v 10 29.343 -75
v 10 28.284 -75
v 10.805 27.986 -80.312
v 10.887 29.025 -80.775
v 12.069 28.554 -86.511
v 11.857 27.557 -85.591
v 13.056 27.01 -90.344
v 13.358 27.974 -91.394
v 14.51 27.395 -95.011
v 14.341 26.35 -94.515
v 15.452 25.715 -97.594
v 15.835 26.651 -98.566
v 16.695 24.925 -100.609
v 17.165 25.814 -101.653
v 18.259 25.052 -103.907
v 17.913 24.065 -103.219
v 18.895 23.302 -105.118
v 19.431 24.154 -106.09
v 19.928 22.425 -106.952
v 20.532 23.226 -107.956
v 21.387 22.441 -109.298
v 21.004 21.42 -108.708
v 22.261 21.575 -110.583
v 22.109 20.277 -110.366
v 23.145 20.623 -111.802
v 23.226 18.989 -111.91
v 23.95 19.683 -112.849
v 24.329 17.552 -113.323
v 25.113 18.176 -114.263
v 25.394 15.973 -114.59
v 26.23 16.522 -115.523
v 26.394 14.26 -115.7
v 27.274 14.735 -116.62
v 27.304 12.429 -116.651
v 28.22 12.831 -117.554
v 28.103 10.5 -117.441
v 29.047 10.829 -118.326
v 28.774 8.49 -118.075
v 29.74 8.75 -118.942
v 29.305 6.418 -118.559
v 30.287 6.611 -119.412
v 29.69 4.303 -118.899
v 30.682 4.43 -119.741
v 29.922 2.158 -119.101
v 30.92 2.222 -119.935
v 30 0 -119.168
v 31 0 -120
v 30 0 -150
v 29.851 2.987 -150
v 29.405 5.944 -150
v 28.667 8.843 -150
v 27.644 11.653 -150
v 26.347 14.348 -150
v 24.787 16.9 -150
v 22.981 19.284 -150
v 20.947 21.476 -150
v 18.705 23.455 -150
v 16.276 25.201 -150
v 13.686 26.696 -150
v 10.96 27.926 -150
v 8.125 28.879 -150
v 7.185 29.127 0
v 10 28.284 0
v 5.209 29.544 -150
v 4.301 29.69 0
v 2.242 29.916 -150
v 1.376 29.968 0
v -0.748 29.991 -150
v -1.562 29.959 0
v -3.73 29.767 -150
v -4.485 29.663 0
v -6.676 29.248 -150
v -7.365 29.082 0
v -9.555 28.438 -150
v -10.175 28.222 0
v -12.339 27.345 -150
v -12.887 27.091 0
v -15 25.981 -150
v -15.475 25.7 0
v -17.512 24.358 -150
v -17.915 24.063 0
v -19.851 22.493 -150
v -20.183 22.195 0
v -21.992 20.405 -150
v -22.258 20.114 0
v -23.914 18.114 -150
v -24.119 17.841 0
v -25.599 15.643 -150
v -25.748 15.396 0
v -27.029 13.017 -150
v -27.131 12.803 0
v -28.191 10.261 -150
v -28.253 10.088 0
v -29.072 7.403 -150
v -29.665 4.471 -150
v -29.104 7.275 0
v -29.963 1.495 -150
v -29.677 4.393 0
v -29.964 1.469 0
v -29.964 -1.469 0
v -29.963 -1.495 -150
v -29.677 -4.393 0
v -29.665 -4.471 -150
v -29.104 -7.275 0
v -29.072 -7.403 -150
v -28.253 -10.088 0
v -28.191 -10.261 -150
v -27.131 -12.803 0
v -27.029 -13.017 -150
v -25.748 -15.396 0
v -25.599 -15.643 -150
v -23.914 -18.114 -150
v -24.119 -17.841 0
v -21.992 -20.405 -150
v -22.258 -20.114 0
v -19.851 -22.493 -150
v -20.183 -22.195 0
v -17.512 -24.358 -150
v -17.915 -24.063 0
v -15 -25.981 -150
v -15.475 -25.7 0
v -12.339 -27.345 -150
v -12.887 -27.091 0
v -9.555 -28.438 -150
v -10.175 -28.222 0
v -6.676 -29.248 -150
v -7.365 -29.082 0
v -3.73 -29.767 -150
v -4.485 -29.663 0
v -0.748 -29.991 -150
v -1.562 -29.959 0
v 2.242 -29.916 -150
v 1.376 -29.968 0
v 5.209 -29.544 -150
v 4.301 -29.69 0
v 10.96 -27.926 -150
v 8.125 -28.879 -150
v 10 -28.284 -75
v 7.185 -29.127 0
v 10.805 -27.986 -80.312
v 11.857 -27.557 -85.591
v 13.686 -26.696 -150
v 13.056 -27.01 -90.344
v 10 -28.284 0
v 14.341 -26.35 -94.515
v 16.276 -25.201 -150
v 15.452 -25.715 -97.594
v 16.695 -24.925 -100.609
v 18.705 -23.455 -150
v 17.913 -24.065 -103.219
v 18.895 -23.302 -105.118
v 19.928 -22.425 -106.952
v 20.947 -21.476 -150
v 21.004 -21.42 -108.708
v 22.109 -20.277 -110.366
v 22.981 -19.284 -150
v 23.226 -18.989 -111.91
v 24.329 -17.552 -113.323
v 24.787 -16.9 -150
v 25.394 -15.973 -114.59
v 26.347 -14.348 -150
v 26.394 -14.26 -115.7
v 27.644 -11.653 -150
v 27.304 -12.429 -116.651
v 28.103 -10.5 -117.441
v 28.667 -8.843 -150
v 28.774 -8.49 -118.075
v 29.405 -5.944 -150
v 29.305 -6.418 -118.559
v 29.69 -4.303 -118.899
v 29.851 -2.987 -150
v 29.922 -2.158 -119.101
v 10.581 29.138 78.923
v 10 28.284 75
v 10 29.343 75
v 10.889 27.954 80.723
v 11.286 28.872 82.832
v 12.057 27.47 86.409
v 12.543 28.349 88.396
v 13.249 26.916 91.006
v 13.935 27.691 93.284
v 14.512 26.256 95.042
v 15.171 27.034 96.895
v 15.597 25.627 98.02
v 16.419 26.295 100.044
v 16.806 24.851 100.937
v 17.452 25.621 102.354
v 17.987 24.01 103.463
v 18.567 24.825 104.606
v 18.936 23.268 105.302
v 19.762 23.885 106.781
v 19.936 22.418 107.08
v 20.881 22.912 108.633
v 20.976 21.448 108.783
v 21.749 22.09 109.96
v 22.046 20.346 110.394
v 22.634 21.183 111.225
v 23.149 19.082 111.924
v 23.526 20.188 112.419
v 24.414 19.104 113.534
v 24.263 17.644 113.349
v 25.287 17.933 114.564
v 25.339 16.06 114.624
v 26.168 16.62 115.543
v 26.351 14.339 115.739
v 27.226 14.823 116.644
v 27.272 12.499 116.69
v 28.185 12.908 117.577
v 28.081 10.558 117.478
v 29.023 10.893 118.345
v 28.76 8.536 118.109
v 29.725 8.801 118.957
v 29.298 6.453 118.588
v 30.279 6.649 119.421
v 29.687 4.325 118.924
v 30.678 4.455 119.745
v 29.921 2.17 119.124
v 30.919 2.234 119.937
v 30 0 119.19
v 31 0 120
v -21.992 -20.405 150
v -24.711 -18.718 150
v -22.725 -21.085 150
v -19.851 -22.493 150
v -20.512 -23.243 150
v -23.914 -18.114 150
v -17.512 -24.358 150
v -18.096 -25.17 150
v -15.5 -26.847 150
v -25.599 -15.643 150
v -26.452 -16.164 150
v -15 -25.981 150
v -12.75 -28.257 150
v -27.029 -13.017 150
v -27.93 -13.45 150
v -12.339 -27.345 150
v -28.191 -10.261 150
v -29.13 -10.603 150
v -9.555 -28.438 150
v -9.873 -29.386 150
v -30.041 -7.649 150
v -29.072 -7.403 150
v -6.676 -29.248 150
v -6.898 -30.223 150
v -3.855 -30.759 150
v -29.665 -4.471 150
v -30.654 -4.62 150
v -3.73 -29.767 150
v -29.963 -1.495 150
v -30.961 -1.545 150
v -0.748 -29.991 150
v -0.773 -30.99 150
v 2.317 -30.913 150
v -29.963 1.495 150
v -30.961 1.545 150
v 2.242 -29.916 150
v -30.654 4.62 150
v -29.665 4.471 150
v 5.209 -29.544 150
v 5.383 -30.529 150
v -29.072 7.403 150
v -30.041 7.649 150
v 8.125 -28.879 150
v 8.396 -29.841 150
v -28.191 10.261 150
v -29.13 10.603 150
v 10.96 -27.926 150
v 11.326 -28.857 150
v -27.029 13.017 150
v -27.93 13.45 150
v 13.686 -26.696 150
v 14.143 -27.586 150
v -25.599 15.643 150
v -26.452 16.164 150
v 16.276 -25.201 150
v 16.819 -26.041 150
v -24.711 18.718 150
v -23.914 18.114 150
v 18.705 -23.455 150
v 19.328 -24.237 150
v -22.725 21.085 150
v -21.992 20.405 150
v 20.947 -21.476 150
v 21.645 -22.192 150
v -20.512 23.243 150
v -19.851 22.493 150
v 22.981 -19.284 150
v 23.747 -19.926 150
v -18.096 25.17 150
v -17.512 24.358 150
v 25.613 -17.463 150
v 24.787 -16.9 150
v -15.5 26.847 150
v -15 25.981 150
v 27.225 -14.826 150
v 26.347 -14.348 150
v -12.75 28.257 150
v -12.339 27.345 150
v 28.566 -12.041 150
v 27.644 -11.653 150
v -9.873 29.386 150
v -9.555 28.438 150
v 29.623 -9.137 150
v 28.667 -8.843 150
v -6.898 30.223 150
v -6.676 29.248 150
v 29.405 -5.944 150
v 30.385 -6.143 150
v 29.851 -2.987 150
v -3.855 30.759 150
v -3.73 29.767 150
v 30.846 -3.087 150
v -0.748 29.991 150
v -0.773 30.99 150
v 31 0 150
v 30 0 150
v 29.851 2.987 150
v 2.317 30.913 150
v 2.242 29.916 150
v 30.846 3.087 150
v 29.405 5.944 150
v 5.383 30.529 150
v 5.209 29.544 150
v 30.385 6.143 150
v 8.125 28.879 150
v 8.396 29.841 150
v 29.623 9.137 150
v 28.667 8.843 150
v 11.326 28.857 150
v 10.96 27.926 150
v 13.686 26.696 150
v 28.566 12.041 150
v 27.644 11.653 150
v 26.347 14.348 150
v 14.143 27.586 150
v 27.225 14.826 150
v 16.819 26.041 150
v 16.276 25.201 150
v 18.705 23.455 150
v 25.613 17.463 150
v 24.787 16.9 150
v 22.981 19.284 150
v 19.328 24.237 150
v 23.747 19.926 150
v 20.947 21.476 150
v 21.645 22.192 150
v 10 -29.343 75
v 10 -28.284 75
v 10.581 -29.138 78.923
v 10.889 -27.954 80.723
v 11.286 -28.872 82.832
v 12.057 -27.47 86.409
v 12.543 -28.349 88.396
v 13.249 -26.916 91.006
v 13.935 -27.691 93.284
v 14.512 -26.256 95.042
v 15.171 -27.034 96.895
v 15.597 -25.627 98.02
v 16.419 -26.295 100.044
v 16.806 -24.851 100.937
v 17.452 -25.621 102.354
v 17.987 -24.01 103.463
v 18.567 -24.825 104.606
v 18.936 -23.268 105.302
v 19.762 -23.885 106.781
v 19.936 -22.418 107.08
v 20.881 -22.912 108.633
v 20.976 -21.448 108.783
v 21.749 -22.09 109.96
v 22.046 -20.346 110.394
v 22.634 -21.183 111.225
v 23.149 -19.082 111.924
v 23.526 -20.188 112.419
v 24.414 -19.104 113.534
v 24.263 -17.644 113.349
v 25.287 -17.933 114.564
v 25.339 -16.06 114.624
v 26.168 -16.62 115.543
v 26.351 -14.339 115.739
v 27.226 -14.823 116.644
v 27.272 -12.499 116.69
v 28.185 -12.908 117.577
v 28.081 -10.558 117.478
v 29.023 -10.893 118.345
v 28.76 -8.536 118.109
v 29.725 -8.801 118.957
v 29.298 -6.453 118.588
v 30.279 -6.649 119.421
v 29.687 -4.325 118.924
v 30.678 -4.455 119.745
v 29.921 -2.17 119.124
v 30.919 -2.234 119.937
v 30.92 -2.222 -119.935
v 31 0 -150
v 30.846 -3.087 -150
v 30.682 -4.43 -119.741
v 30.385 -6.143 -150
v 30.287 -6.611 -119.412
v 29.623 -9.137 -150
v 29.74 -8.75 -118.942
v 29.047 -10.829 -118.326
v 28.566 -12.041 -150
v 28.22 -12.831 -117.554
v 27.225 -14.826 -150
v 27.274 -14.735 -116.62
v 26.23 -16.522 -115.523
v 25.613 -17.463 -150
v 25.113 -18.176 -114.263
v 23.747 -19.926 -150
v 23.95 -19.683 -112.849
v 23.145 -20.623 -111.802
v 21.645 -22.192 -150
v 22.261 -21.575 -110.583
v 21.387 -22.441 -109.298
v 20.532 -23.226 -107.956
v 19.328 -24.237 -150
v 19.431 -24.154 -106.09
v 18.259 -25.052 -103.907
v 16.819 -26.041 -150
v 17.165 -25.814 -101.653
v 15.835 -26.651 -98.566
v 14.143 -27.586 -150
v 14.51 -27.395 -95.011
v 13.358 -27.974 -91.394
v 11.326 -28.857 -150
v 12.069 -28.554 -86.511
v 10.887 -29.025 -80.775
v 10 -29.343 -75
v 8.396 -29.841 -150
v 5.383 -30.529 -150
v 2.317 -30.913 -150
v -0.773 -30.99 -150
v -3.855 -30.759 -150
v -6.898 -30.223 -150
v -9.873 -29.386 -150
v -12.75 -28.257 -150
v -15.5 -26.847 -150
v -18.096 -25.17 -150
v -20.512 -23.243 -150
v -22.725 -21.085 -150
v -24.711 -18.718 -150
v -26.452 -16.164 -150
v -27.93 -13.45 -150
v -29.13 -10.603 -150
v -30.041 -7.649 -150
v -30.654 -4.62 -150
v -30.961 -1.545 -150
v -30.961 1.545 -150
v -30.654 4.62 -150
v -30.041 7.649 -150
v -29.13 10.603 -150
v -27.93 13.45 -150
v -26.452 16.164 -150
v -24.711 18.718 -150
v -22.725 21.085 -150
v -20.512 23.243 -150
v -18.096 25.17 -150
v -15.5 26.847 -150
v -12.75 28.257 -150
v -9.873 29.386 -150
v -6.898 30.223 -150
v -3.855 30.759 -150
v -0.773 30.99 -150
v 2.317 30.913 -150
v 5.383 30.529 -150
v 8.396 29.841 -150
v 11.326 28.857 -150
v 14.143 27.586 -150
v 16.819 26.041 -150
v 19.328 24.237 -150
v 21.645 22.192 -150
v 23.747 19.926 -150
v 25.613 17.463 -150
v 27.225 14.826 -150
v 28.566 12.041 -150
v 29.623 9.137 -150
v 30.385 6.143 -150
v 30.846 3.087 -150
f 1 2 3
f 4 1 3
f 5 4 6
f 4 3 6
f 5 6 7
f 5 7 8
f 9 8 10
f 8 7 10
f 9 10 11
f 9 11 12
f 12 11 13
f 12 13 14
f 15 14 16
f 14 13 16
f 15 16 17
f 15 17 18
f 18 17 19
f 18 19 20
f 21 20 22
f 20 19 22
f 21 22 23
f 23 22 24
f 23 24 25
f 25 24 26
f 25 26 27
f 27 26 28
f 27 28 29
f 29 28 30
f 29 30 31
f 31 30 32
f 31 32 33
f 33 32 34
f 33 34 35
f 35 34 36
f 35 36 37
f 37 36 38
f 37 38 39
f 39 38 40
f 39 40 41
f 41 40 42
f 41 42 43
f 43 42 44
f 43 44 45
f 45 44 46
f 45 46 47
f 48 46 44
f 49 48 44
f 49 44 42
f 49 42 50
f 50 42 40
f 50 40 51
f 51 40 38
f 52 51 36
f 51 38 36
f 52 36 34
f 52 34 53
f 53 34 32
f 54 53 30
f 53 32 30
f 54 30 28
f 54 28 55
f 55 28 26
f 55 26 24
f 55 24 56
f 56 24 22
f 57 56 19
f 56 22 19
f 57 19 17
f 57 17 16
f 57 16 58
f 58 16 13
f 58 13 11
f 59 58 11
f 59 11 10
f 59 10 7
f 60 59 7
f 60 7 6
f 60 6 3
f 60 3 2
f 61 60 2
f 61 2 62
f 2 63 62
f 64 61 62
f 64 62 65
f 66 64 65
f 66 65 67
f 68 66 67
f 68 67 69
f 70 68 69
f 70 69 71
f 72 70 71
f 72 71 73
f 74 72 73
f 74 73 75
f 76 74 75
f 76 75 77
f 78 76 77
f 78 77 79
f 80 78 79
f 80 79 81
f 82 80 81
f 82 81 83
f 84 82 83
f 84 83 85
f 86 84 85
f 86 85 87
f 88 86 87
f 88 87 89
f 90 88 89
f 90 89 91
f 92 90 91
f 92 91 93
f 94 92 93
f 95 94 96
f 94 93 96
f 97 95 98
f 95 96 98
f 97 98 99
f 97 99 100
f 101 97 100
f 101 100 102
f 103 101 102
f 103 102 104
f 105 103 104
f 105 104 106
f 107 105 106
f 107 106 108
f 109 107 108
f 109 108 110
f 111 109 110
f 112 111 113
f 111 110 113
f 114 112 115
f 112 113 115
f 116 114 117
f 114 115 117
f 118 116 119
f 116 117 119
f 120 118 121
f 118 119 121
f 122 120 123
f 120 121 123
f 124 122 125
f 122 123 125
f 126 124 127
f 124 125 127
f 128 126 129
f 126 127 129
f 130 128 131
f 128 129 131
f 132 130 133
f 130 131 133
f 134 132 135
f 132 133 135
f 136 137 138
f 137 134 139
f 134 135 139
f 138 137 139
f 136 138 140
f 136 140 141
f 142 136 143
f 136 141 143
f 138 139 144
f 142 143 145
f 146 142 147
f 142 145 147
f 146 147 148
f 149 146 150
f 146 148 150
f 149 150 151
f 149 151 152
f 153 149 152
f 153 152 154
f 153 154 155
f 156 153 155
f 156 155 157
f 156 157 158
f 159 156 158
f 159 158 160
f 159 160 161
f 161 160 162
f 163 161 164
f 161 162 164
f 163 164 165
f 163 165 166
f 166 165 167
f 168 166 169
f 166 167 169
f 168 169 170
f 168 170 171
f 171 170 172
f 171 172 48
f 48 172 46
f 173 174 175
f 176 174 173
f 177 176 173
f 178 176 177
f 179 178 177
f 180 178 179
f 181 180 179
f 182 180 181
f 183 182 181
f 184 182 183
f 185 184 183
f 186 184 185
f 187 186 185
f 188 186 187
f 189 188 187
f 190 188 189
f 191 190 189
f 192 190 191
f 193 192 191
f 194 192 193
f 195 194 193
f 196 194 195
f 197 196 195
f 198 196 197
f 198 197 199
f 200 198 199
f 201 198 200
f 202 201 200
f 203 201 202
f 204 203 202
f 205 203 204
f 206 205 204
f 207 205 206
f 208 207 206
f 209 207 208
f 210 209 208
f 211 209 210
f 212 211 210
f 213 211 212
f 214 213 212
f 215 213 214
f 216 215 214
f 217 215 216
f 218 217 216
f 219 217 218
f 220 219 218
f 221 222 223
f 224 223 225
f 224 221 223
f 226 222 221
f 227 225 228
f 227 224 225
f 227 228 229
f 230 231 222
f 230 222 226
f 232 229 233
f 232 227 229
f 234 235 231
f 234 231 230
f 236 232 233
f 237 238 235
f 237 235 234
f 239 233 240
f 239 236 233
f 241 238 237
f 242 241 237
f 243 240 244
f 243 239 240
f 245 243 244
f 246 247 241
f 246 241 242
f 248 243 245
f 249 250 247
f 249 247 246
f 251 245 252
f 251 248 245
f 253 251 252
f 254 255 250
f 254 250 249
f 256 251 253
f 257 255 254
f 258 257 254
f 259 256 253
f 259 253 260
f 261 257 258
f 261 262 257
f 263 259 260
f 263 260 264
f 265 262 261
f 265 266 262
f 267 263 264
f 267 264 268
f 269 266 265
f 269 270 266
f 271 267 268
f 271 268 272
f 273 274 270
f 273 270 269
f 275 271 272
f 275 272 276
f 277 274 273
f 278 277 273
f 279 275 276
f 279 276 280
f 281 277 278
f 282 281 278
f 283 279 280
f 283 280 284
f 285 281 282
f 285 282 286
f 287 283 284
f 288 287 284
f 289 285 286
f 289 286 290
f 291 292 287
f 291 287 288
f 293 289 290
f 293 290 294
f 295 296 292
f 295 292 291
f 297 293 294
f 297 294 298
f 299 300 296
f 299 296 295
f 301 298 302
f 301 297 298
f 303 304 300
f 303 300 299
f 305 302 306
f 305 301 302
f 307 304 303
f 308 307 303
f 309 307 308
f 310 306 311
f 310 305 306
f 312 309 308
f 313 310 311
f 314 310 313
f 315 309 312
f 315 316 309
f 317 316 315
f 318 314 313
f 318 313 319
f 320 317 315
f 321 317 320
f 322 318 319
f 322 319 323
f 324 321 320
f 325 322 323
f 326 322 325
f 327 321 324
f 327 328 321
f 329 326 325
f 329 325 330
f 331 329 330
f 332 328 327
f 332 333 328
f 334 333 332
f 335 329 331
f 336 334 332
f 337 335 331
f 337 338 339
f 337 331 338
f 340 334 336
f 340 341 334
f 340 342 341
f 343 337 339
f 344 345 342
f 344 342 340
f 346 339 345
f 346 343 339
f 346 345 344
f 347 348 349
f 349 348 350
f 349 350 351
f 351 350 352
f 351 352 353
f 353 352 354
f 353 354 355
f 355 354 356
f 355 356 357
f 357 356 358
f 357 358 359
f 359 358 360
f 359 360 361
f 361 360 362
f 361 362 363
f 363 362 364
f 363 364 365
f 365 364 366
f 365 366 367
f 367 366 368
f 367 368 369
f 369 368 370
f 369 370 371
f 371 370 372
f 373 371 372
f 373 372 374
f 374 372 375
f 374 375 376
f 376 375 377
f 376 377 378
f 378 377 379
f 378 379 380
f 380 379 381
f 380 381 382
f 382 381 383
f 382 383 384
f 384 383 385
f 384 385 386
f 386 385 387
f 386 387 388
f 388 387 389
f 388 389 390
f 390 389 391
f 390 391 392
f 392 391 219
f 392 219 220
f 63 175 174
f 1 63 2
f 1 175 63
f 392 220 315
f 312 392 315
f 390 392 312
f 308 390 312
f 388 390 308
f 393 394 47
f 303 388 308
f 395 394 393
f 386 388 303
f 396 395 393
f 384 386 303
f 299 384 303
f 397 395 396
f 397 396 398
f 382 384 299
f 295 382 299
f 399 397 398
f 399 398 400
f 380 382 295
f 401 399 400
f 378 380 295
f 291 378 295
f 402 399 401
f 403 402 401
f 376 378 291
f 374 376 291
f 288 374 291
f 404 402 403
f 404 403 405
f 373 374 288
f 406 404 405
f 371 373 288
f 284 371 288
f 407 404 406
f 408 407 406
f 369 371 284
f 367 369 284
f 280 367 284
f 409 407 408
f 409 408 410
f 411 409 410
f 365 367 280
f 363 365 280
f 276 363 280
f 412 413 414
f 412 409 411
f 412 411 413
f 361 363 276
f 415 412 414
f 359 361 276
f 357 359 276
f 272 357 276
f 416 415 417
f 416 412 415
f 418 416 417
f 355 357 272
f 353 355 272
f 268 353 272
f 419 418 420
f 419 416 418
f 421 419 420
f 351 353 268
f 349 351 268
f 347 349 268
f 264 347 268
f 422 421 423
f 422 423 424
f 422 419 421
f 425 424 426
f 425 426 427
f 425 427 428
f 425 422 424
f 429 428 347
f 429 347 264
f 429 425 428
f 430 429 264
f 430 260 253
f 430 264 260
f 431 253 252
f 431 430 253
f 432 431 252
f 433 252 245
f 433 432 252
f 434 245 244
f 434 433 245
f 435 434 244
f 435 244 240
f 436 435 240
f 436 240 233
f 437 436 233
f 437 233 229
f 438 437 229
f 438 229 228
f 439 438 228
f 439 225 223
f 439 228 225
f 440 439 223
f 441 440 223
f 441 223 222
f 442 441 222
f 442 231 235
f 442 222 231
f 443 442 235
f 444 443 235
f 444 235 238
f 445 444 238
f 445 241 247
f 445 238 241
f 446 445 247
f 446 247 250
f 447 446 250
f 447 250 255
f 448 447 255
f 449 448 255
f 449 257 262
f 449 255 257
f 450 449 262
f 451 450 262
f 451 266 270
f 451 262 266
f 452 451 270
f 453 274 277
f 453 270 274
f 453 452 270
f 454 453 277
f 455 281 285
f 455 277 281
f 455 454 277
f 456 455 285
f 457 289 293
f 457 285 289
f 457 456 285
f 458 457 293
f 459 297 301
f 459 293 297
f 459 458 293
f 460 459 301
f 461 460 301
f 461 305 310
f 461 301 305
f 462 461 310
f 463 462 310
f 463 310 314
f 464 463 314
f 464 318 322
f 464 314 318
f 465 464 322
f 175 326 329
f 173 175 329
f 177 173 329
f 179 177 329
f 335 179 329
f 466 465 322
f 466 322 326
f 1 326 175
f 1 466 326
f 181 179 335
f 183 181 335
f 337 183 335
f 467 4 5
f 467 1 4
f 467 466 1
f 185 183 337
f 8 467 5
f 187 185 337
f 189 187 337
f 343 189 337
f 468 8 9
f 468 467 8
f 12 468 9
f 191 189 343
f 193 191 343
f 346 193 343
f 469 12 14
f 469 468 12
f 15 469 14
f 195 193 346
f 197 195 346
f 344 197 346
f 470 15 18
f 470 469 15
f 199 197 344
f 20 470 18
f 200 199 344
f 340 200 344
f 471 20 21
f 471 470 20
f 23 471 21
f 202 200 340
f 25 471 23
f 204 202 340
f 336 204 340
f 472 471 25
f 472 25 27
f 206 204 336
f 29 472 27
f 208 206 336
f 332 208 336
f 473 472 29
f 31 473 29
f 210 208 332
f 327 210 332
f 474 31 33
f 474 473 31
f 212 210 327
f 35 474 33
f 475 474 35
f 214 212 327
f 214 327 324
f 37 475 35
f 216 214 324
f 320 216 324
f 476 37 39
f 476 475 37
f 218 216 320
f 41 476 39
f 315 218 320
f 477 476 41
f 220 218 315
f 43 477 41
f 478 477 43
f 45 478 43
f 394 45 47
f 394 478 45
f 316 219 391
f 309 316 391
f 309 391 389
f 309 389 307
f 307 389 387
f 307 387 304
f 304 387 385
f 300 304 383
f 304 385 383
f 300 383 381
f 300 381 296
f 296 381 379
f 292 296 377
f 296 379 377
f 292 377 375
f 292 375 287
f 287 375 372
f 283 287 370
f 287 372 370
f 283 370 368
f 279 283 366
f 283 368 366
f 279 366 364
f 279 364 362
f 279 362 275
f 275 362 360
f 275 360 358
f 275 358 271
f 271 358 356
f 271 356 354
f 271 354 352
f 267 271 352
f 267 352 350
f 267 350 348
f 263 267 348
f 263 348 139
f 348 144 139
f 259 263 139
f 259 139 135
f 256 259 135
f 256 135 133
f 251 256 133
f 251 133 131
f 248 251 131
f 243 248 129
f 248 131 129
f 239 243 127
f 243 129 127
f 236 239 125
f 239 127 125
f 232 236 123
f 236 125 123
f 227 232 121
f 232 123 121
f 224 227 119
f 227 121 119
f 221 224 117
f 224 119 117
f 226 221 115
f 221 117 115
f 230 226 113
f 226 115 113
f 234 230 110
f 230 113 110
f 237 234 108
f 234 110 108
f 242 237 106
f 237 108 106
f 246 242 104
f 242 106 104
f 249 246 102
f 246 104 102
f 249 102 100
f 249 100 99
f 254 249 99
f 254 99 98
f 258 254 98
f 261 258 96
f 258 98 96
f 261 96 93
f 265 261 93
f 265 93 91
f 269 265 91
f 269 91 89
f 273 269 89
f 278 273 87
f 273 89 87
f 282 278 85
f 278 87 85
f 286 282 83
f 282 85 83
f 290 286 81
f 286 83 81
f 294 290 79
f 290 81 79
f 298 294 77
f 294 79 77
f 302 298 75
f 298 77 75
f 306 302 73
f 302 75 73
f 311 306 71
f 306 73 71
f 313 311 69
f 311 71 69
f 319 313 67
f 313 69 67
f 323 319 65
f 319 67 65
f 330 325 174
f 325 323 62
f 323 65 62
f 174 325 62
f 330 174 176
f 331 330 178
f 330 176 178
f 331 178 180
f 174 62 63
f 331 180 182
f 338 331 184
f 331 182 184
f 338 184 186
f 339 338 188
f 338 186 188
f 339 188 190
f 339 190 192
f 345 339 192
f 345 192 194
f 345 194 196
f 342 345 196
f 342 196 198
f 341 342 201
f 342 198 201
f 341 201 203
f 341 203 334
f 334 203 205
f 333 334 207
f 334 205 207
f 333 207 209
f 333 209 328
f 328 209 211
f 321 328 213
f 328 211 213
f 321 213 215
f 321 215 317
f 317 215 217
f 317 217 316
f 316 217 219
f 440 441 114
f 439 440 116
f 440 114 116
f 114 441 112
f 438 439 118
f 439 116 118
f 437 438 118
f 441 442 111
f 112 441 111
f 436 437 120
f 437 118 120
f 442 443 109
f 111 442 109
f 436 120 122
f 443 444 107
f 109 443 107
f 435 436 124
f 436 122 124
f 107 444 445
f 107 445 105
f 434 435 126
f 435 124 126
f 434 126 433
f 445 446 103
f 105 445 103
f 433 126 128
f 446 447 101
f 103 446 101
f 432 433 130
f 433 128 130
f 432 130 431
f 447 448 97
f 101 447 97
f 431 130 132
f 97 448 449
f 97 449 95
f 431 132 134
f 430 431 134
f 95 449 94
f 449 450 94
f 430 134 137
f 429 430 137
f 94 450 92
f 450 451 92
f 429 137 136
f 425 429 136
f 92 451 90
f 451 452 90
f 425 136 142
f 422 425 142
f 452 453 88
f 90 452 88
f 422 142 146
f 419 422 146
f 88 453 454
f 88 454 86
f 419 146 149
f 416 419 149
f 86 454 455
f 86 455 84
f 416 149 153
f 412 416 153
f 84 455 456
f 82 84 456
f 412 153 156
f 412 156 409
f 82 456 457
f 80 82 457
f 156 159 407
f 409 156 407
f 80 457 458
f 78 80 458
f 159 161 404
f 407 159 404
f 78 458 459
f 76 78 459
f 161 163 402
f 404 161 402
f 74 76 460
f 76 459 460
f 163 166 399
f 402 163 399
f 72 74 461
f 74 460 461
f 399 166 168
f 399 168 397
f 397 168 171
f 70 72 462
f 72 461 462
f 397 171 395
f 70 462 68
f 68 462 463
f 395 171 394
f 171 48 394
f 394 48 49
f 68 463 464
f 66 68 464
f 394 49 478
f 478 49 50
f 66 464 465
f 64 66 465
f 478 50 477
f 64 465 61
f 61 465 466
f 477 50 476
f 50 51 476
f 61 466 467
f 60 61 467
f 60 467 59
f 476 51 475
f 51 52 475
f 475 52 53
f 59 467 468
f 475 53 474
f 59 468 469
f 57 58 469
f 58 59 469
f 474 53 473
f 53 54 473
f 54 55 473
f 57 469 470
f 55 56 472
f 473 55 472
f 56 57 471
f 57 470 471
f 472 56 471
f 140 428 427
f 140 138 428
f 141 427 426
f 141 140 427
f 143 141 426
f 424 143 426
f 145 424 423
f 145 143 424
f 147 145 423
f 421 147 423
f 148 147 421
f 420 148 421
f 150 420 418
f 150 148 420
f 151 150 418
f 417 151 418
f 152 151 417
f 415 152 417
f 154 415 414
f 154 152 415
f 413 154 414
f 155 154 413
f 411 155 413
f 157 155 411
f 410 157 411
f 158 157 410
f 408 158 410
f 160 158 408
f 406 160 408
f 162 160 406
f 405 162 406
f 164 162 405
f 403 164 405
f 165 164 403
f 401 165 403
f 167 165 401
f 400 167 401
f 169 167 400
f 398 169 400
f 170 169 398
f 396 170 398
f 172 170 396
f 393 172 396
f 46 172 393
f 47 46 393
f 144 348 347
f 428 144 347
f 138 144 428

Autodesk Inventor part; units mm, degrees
ref_plane "YZ Plane" through (0, 0, 0) normal (1, 0, 0) x (0, 1, 0)
ref_plane "XZ Plane" through (0, 0, 0) normal (0, 1, 0) x (-1, 0, 0)
ref_plane "XY Plane" through (0, 0, 0) normal (0, 0, 1) x (1, 0, 0)
sketch "Skizze1" plane through (0, 0, 0) normal (0, 0, 1) x (1, 0, 0)
  circle A0 centre (0, 0) radius 31
  circle A1 centre (0, 0) radius 30
  dimension "d0" = 62
  dimension "d1" = 60
extrude "Extrusion1" add sketch "Skizze1" along normal mid plane 300
sketch "Skizze2" plane through (0, 0, 0) normal (0, 1, 0) x (-1, 0, 0)
  line L0 (-10, 169.5773) -> (-10, -169.8146) construction
  line L1 (-74.8376, 0) -> (82.6362, 0) construction
  line L2 (-10, 75) -> (-10, -75)
  line L3 (-31, -150) -> (-31, 150) projected
  line L4 (31, 150) -> (-31, 150) projected
  line L5 (-31, -150) -> (31, -150) projected
  spline S0 degree 2 poles (-10, 75) (-18.1599, 136.3675) (-72.8449, 128.3193) knots 0 0 0 1 1 1
  spline S1 degree 2 poles (-10, -75) (-17.9565, -136.1553) (-74.8376, -130) knots 0 0 0 1 1 1
  line L6 (-72.8449, 128.3193) -> (-74.8376, -130)
  point P0 (0, 0)
  point P1 (-31, 120)
  point P2 (-31, -120)
  dimension "d4" = 10
  dimension "d5" = 150
  dimension "d6" = 30
  dimension "d7" = 30
extrude "Extrusion2" cut sketch "Skizze2" against normal mid plane 65 contours L2 S1 L3 S0
properties part number "Segment_mitte"
